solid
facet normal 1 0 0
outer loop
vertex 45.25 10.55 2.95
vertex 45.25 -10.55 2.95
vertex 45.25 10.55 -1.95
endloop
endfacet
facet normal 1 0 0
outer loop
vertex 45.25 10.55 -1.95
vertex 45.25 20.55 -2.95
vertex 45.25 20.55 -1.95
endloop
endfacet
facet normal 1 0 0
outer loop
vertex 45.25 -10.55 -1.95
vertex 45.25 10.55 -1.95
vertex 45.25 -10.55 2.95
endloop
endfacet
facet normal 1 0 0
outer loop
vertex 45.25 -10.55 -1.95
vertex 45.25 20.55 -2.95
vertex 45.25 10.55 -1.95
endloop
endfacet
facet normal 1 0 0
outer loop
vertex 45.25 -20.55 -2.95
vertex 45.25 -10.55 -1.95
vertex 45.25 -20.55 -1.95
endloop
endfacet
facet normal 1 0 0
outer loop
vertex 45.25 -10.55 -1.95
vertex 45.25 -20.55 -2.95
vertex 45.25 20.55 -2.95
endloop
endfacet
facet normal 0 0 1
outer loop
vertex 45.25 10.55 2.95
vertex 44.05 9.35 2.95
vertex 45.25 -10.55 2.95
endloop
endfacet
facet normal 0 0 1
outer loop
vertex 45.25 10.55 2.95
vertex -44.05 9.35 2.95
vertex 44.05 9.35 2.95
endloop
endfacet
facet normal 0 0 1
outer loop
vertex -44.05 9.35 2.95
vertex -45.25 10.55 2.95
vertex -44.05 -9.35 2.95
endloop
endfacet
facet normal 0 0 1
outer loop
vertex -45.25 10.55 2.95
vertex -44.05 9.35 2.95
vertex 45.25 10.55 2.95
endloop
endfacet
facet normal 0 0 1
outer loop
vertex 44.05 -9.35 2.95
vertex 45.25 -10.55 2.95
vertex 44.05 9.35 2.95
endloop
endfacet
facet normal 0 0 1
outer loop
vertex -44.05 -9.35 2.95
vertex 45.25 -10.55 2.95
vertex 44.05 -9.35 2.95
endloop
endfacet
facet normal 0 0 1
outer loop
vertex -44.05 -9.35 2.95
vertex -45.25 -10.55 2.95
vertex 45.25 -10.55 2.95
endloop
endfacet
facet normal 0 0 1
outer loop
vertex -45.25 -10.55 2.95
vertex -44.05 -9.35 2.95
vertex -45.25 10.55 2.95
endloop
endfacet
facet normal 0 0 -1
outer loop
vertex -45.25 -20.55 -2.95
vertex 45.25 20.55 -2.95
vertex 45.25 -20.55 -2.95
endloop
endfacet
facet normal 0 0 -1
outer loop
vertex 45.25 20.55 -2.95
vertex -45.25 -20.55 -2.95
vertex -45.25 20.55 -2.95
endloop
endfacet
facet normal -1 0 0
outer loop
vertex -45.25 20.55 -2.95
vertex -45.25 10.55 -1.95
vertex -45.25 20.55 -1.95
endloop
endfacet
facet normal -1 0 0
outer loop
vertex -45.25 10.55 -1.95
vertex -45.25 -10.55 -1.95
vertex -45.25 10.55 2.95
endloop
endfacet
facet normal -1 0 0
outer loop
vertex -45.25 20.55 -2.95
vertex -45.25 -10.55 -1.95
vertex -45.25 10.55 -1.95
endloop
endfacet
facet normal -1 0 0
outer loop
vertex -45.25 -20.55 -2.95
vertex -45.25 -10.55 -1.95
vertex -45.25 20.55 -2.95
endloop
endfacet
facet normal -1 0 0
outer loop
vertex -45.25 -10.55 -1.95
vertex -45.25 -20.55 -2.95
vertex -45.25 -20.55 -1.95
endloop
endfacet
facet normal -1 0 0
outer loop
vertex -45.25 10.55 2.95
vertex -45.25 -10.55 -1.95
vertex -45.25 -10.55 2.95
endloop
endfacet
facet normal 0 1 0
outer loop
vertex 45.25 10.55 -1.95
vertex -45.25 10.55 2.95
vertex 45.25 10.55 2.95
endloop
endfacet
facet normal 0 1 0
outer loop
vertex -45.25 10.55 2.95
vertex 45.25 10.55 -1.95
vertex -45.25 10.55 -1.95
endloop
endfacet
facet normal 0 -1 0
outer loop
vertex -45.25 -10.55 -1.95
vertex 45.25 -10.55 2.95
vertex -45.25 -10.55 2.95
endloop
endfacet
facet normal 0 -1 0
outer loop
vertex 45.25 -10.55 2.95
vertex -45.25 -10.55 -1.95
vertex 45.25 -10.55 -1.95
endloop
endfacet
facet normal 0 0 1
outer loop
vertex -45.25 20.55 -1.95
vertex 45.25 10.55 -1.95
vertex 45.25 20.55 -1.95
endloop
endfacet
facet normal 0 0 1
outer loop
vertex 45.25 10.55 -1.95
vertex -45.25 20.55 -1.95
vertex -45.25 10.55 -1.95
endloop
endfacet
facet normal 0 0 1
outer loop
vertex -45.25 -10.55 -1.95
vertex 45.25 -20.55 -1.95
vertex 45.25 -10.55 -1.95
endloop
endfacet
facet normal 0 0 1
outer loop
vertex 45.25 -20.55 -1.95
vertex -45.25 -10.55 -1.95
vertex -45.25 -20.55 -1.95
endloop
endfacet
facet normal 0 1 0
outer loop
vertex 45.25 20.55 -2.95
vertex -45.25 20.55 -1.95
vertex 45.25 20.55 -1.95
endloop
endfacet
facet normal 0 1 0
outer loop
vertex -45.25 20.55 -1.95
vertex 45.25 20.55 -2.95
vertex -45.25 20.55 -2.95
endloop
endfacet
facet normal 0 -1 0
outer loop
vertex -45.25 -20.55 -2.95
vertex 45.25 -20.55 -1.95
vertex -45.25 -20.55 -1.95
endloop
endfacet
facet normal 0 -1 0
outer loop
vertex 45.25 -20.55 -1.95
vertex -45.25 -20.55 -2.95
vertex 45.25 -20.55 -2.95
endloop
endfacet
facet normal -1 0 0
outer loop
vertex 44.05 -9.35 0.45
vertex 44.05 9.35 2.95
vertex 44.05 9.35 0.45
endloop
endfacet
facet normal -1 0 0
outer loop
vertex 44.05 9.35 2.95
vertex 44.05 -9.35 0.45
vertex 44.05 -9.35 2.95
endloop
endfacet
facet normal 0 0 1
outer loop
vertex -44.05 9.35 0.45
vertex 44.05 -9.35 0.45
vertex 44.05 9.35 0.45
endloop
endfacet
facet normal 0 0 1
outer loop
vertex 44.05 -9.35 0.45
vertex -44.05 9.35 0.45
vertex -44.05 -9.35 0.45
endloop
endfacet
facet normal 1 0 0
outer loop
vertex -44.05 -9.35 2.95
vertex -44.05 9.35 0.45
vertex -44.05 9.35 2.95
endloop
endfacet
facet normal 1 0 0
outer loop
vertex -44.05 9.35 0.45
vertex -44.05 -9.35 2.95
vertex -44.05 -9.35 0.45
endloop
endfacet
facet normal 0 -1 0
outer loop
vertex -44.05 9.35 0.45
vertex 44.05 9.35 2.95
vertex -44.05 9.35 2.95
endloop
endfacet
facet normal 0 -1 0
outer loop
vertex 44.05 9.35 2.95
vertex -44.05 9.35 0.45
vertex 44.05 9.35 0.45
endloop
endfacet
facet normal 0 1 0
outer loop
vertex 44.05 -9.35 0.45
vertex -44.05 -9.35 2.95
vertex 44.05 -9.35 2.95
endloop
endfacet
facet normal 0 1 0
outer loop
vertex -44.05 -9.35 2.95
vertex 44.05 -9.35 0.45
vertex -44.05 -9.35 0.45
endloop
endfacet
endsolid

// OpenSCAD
// file: lib/util.scad
function repeat(x, c) = [for (i = [1 : c]) x];

module cube_centered_xy(s) {
	translate([0, 0, s[2]/2]) cube(s, center=true);
}

module cube_shell(size, wall_thickness, center=false) {
	if (center) {
		cube_shell_int(size, wall_thickness);
	} else {
		translate([size[0]/2 + wall_thickness, size[1]/2 + wall_thickness, 0])
		cube_shell_int(size, wall_thickness);
	}
}

module cube_shell_int(size, wall_thickness) {
	difference() {
		cube_centered_xy(size + [wall_thickness*2, wall_thickness*2, wall_thickness]);
		translate([0, 0, wall_thickness]) cube_centered_xy(size + [0, 0, 0.001]);
	}
}

module rotate_all(increment=90) {
	for (i = [0 : increment : 360]) {
		rotate(i) children();
	}
}

module mirror_all() {
	children();
	scale([-1, 1, 1]) children();
	scale([1, -1, 1]) children();
	scale([-1, -1, 1]) children();
}
// main file
//88.1 18.7 

use <lib/util.scad>;

thickness = 1.2;
length = 88.1;
width = 18.7;
height = 2.5;
base_height = 1;
base_width = 10;

size = [length, width, height];
outer_size = size + repeat(thickness*2, 3) + [0, 0, base_height];

difference() {
	union() {
		cube(outer_size, center=true);  
		translate([0, 0, -outer_size[2]/2 + base_height/2]) cube([outer_size[0], outer_size[1] + base_width*2, base_height], center=true);
	}
	translate([0, 0, base_height/2+thickness+0.001]) cube(size + [0, 0, 0.002], center=true);
}
